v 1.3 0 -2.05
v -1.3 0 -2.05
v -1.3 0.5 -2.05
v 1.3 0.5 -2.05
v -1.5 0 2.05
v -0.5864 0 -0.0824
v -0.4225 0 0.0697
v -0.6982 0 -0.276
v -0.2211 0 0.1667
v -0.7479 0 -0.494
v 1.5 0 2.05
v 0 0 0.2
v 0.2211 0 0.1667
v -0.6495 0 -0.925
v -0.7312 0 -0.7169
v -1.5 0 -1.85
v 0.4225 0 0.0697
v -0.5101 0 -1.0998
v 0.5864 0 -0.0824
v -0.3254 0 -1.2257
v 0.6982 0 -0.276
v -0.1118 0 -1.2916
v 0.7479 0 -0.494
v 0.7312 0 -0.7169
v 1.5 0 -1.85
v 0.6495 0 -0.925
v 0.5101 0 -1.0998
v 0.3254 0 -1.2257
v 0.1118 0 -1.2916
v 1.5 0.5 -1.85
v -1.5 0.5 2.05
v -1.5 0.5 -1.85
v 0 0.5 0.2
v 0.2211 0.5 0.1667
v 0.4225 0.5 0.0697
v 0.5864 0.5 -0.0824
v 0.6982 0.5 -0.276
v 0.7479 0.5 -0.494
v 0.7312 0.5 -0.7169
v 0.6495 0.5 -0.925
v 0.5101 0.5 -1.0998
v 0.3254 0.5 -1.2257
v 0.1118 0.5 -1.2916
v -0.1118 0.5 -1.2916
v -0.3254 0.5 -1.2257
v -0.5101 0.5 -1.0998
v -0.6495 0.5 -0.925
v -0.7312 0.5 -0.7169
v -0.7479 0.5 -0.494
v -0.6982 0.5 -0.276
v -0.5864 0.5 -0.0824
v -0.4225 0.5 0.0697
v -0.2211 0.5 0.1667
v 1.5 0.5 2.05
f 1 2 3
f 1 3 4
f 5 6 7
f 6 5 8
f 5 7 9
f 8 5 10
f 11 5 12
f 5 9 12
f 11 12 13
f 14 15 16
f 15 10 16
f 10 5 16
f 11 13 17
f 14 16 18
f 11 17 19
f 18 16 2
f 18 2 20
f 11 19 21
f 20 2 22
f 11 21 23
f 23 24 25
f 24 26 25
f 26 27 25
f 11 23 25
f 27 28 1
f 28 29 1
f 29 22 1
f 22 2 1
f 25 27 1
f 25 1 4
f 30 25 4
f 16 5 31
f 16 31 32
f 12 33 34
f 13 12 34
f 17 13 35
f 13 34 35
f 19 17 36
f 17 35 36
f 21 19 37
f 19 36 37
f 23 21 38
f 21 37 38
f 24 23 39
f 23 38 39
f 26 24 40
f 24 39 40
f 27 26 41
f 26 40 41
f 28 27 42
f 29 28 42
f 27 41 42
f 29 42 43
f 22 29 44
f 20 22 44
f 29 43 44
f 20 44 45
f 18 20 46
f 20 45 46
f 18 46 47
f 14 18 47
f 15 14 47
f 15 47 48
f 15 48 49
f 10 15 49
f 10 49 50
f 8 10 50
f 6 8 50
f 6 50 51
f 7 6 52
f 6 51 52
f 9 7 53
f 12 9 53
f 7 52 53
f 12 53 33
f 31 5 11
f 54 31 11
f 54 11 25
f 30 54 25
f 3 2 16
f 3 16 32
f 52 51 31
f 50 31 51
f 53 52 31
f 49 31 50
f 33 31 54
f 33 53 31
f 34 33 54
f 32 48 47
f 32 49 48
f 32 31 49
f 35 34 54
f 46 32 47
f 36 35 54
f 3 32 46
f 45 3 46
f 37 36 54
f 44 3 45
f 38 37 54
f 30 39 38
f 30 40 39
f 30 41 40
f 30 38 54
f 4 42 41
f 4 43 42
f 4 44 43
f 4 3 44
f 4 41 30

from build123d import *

# Parameters (mm, degrees)
CROQUIS1_W              = 3
CROQUIS1_H              = 4.1
SALIENTE_EXTRUIR1_DEPTH = 0.5
CHAFL_N1_SIZE           = 0.2
CROQUIS2_R              = 0.75
CORTAR_EXTRUIR1_DEPTH   = 0.5


with BuildPart() as part:
    # Croquis1 → Saliente-Extruir1 (new body)
    with BuildSketch(Plane(origin=(0, 0, 0), x_dir=(1, 0, 0), z_dir=(0, 1, 0))):
        Rectangle(CROQUIS1_W, CROQUIS1_H)
    extrude(amount=SALIENTE_EXTRUIR1_DEPTH)

    # Chaflán1
    chafl_n1_edges = [part.edges().sort_by_distance(p)[0] for p in [
        (-1.5, 0.25, -2.05),
        (1.5, 0.25, -2.05),
    ]]
    chamfer(chafl_n1_edges, length=CHAFL_N1_SIZE)

    # Croquis2 → Cortar-Extruir1 (cut)
    with BuildSketch(Plane(origin=(0, 0.5, 0), x_dir=(1, 0, 0), z_dir=(0, 1, 0))):
        with Locations(Location((0, 0.55, 0), (0, 0, 270))):
            Circle(CROQUIS2_R)
    extrude(amount=-CORTAR_EXTRUIR1_DEPTH, mode=Mode.SUBTRACT)


solid = part.part
